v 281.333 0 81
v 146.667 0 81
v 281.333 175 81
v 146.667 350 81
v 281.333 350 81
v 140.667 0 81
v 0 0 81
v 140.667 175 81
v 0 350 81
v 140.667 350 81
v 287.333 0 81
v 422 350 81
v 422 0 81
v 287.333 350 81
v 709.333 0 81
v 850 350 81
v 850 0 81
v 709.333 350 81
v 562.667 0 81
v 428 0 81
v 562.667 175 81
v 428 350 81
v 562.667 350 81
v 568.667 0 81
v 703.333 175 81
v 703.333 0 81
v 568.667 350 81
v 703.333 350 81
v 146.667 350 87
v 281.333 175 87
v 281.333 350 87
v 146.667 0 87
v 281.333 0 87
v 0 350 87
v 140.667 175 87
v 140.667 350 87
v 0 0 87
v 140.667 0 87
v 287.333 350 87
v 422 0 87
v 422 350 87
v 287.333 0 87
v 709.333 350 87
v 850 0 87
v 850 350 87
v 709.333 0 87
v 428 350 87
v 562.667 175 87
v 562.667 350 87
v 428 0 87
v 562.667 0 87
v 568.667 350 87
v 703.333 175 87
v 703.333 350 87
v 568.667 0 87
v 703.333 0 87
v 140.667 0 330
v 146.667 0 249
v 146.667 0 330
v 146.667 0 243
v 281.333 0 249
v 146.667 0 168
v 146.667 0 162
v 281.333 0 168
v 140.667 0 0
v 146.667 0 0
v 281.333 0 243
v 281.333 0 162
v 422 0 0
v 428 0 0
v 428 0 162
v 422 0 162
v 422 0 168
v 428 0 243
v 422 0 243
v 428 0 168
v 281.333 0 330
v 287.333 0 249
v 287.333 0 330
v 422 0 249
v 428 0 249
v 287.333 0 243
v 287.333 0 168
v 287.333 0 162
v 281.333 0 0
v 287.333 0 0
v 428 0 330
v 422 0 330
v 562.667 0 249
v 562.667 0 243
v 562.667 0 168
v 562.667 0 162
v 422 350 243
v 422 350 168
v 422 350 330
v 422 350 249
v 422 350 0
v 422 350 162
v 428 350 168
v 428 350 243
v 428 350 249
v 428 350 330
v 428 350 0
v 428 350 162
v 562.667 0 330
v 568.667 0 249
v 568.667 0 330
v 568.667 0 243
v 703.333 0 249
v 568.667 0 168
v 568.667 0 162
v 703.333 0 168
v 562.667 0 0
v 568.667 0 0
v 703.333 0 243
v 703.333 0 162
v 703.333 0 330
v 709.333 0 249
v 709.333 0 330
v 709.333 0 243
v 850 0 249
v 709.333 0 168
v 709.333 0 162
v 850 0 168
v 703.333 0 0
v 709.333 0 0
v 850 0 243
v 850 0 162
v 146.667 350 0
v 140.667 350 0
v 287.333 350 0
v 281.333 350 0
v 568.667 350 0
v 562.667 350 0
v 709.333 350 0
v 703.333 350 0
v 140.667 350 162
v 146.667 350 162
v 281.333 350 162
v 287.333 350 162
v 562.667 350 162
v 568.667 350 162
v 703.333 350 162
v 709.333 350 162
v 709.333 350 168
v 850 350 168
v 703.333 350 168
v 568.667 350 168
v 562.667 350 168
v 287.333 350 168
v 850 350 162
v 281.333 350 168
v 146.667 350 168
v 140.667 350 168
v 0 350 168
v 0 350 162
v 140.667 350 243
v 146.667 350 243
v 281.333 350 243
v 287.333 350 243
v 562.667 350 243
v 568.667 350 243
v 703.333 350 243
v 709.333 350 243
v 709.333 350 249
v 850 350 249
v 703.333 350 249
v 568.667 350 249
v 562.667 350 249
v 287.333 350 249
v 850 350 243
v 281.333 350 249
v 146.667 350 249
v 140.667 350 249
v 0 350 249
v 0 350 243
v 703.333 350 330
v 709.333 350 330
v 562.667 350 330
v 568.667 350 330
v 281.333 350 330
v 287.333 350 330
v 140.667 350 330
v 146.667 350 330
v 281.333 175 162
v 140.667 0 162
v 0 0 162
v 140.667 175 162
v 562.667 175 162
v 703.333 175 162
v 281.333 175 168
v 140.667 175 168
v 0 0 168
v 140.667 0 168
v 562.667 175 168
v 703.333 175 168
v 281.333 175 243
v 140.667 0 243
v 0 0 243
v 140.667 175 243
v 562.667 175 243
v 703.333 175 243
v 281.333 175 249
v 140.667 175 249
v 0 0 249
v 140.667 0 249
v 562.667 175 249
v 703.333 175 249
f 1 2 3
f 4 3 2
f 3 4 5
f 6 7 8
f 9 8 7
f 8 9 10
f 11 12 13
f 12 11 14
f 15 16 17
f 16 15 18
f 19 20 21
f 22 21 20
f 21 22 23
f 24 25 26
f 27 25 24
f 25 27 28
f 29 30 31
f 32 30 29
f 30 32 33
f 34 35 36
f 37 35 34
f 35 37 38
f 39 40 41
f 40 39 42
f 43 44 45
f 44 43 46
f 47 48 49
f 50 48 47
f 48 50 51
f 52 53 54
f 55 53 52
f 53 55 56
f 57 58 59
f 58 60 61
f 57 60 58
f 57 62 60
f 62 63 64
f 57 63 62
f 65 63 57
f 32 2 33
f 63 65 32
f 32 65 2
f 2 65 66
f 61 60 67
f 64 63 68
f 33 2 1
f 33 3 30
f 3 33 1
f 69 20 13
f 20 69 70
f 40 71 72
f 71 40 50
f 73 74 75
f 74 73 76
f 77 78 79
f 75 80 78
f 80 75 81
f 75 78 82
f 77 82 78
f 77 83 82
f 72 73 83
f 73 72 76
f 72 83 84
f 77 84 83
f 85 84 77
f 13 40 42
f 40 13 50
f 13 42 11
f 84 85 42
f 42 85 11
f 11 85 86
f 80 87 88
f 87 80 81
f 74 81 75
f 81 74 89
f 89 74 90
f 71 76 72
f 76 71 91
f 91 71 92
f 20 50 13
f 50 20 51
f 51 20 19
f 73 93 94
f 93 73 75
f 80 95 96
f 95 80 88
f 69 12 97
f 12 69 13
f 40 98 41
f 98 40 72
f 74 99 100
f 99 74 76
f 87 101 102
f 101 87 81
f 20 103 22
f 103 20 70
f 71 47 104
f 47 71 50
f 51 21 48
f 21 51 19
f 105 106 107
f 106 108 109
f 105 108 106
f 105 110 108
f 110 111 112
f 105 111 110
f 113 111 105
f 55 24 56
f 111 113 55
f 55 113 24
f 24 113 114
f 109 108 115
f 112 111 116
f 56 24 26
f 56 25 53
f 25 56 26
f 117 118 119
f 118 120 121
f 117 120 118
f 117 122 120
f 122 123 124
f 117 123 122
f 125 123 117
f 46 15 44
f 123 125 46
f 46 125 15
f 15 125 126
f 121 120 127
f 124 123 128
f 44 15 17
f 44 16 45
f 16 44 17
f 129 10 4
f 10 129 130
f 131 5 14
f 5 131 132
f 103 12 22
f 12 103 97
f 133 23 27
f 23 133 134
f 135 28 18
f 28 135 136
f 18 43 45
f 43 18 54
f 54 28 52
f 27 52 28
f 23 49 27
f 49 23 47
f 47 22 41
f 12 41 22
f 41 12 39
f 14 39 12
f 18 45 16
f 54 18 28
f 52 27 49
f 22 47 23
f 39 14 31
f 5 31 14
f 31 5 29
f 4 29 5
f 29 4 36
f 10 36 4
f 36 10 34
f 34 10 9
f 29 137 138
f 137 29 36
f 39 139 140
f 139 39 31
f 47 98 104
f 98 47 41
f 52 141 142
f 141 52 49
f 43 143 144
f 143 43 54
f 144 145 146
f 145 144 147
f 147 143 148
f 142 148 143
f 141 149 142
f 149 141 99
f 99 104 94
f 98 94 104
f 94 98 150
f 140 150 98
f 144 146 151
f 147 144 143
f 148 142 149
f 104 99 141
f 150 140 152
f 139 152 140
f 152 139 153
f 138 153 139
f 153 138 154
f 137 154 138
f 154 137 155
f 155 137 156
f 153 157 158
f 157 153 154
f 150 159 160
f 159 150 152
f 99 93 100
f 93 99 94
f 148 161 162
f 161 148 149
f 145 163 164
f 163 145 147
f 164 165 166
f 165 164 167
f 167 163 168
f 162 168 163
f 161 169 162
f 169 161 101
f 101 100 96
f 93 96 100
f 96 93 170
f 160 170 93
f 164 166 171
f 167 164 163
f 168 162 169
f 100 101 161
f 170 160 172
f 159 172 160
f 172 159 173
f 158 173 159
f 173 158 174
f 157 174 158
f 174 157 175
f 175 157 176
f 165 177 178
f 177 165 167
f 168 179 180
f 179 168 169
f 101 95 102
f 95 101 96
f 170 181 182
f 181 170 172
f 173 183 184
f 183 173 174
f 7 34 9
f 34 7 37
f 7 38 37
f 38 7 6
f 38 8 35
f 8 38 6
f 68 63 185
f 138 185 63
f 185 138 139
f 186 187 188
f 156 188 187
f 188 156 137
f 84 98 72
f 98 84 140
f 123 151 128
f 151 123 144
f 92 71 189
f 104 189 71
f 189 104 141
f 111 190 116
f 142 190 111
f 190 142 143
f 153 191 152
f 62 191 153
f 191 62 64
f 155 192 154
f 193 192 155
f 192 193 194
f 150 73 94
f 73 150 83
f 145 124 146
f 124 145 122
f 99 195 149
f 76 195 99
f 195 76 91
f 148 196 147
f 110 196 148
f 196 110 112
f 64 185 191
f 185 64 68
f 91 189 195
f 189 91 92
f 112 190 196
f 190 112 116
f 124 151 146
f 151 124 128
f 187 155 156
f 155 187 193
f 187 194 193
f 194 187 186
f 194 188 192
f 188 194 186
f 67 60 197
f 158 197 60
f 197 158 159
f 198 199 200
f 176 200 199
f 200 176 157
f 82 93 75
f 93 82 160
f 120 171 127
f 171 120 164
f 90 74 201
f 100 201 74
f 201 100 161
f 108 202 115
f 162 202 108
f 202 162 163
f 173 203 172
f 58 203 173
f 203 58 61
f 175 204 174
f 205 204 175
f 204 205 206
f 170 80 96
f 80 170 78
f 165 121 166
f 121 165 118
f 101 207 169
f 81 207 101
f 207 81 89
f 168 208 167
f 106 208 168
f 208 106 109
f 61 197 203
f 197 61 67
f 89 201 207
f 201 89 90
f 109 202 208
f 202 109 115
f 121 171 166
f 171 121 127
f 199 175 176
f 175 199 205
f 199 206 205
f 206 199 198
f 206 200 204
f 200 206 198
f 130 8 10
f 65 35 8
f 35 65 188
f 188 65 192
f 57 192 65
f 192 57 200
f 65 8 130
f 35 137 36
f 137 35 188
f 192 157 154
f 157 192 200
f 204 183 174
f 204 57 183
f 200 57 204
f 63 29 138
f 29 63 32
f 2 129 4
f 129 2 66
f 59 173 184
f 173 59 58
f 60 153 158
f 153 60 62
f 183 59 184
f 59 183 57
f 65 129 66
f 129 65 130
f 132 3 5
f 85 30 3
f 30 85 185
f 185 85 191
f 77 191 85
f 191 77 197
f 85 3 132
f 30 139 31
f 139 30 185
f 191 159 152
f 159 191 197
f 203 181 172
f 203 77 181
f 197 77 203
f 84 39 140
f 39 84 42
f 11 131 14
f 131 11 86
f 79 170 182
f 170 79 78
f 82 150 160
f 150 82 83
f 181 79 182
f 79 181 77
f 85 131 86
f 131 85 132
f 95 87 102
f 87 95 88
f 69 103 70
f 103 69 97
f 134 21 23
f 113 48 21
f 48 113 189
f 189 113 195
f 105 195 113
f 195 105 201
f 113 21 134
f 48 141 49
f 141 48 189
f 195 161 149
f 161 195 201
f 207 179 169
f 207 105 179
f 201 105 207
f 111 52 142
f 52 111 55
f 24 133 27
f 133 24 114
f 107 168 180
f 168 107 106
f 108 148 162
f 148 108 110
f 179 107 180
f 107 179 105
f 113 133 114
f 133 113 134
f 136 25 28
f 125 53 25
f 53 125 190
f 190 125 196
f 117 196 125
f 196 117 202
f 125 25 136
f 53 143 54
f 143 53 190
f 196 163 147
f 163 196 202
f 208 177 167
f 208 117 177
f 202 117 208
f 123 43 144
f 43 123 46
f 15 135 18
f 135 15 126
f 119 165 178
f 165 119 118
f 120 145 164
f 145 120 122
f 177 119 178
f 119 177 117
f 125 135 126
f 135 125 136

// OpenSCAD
/*Compartments
Simple Script to generate Compartments for a rectangular container.
*/

//Settings
xNr = 4;
yNr = 6;
xD = 330;
yD = 850;
depth = 350;
thickness = 6;
end = 1;
margin = .001;

//Make Planes
module horizontalPlane() {
    linear_extrude(height=thickness)difference() {
        square([yD,depth]);
        for(i=[end:yNr-end])translate([i*(yD-thickness)/yNr,0])square([thickness,depth/2]);
    }
}
module verticalPlane() {
    linear_extrude(height=thickness)translate([xD,depth])rotate(a=[0,0,180])difference() {
        square([xD,depth]);
        for(i=[end:xNr-end])translate([i*(xD-thickness)/xNr,0])square([thickness,depth/2]);
    }
}

//Render
module render() {
    for(i=[end:xNr-end])translate([0,0,i*(xD-thickness)/xNr])horizontalPlane();
    for(i=[end:yNr-end])translate([i*(yD-thickness)/yNr,0,0])translate([0,0,xD])rotate([0,90,0])verticalPlane();
}    
//Export
module export() {
    for(i=[end:yNr-end])translate([yD+margin,i*(depth+margin),0])projection()verticalPlane();
    for(i=[end:xNr-end])translate([0,i*(depth+margin)])projection()horizontalPlane();
}

!render();
export();
